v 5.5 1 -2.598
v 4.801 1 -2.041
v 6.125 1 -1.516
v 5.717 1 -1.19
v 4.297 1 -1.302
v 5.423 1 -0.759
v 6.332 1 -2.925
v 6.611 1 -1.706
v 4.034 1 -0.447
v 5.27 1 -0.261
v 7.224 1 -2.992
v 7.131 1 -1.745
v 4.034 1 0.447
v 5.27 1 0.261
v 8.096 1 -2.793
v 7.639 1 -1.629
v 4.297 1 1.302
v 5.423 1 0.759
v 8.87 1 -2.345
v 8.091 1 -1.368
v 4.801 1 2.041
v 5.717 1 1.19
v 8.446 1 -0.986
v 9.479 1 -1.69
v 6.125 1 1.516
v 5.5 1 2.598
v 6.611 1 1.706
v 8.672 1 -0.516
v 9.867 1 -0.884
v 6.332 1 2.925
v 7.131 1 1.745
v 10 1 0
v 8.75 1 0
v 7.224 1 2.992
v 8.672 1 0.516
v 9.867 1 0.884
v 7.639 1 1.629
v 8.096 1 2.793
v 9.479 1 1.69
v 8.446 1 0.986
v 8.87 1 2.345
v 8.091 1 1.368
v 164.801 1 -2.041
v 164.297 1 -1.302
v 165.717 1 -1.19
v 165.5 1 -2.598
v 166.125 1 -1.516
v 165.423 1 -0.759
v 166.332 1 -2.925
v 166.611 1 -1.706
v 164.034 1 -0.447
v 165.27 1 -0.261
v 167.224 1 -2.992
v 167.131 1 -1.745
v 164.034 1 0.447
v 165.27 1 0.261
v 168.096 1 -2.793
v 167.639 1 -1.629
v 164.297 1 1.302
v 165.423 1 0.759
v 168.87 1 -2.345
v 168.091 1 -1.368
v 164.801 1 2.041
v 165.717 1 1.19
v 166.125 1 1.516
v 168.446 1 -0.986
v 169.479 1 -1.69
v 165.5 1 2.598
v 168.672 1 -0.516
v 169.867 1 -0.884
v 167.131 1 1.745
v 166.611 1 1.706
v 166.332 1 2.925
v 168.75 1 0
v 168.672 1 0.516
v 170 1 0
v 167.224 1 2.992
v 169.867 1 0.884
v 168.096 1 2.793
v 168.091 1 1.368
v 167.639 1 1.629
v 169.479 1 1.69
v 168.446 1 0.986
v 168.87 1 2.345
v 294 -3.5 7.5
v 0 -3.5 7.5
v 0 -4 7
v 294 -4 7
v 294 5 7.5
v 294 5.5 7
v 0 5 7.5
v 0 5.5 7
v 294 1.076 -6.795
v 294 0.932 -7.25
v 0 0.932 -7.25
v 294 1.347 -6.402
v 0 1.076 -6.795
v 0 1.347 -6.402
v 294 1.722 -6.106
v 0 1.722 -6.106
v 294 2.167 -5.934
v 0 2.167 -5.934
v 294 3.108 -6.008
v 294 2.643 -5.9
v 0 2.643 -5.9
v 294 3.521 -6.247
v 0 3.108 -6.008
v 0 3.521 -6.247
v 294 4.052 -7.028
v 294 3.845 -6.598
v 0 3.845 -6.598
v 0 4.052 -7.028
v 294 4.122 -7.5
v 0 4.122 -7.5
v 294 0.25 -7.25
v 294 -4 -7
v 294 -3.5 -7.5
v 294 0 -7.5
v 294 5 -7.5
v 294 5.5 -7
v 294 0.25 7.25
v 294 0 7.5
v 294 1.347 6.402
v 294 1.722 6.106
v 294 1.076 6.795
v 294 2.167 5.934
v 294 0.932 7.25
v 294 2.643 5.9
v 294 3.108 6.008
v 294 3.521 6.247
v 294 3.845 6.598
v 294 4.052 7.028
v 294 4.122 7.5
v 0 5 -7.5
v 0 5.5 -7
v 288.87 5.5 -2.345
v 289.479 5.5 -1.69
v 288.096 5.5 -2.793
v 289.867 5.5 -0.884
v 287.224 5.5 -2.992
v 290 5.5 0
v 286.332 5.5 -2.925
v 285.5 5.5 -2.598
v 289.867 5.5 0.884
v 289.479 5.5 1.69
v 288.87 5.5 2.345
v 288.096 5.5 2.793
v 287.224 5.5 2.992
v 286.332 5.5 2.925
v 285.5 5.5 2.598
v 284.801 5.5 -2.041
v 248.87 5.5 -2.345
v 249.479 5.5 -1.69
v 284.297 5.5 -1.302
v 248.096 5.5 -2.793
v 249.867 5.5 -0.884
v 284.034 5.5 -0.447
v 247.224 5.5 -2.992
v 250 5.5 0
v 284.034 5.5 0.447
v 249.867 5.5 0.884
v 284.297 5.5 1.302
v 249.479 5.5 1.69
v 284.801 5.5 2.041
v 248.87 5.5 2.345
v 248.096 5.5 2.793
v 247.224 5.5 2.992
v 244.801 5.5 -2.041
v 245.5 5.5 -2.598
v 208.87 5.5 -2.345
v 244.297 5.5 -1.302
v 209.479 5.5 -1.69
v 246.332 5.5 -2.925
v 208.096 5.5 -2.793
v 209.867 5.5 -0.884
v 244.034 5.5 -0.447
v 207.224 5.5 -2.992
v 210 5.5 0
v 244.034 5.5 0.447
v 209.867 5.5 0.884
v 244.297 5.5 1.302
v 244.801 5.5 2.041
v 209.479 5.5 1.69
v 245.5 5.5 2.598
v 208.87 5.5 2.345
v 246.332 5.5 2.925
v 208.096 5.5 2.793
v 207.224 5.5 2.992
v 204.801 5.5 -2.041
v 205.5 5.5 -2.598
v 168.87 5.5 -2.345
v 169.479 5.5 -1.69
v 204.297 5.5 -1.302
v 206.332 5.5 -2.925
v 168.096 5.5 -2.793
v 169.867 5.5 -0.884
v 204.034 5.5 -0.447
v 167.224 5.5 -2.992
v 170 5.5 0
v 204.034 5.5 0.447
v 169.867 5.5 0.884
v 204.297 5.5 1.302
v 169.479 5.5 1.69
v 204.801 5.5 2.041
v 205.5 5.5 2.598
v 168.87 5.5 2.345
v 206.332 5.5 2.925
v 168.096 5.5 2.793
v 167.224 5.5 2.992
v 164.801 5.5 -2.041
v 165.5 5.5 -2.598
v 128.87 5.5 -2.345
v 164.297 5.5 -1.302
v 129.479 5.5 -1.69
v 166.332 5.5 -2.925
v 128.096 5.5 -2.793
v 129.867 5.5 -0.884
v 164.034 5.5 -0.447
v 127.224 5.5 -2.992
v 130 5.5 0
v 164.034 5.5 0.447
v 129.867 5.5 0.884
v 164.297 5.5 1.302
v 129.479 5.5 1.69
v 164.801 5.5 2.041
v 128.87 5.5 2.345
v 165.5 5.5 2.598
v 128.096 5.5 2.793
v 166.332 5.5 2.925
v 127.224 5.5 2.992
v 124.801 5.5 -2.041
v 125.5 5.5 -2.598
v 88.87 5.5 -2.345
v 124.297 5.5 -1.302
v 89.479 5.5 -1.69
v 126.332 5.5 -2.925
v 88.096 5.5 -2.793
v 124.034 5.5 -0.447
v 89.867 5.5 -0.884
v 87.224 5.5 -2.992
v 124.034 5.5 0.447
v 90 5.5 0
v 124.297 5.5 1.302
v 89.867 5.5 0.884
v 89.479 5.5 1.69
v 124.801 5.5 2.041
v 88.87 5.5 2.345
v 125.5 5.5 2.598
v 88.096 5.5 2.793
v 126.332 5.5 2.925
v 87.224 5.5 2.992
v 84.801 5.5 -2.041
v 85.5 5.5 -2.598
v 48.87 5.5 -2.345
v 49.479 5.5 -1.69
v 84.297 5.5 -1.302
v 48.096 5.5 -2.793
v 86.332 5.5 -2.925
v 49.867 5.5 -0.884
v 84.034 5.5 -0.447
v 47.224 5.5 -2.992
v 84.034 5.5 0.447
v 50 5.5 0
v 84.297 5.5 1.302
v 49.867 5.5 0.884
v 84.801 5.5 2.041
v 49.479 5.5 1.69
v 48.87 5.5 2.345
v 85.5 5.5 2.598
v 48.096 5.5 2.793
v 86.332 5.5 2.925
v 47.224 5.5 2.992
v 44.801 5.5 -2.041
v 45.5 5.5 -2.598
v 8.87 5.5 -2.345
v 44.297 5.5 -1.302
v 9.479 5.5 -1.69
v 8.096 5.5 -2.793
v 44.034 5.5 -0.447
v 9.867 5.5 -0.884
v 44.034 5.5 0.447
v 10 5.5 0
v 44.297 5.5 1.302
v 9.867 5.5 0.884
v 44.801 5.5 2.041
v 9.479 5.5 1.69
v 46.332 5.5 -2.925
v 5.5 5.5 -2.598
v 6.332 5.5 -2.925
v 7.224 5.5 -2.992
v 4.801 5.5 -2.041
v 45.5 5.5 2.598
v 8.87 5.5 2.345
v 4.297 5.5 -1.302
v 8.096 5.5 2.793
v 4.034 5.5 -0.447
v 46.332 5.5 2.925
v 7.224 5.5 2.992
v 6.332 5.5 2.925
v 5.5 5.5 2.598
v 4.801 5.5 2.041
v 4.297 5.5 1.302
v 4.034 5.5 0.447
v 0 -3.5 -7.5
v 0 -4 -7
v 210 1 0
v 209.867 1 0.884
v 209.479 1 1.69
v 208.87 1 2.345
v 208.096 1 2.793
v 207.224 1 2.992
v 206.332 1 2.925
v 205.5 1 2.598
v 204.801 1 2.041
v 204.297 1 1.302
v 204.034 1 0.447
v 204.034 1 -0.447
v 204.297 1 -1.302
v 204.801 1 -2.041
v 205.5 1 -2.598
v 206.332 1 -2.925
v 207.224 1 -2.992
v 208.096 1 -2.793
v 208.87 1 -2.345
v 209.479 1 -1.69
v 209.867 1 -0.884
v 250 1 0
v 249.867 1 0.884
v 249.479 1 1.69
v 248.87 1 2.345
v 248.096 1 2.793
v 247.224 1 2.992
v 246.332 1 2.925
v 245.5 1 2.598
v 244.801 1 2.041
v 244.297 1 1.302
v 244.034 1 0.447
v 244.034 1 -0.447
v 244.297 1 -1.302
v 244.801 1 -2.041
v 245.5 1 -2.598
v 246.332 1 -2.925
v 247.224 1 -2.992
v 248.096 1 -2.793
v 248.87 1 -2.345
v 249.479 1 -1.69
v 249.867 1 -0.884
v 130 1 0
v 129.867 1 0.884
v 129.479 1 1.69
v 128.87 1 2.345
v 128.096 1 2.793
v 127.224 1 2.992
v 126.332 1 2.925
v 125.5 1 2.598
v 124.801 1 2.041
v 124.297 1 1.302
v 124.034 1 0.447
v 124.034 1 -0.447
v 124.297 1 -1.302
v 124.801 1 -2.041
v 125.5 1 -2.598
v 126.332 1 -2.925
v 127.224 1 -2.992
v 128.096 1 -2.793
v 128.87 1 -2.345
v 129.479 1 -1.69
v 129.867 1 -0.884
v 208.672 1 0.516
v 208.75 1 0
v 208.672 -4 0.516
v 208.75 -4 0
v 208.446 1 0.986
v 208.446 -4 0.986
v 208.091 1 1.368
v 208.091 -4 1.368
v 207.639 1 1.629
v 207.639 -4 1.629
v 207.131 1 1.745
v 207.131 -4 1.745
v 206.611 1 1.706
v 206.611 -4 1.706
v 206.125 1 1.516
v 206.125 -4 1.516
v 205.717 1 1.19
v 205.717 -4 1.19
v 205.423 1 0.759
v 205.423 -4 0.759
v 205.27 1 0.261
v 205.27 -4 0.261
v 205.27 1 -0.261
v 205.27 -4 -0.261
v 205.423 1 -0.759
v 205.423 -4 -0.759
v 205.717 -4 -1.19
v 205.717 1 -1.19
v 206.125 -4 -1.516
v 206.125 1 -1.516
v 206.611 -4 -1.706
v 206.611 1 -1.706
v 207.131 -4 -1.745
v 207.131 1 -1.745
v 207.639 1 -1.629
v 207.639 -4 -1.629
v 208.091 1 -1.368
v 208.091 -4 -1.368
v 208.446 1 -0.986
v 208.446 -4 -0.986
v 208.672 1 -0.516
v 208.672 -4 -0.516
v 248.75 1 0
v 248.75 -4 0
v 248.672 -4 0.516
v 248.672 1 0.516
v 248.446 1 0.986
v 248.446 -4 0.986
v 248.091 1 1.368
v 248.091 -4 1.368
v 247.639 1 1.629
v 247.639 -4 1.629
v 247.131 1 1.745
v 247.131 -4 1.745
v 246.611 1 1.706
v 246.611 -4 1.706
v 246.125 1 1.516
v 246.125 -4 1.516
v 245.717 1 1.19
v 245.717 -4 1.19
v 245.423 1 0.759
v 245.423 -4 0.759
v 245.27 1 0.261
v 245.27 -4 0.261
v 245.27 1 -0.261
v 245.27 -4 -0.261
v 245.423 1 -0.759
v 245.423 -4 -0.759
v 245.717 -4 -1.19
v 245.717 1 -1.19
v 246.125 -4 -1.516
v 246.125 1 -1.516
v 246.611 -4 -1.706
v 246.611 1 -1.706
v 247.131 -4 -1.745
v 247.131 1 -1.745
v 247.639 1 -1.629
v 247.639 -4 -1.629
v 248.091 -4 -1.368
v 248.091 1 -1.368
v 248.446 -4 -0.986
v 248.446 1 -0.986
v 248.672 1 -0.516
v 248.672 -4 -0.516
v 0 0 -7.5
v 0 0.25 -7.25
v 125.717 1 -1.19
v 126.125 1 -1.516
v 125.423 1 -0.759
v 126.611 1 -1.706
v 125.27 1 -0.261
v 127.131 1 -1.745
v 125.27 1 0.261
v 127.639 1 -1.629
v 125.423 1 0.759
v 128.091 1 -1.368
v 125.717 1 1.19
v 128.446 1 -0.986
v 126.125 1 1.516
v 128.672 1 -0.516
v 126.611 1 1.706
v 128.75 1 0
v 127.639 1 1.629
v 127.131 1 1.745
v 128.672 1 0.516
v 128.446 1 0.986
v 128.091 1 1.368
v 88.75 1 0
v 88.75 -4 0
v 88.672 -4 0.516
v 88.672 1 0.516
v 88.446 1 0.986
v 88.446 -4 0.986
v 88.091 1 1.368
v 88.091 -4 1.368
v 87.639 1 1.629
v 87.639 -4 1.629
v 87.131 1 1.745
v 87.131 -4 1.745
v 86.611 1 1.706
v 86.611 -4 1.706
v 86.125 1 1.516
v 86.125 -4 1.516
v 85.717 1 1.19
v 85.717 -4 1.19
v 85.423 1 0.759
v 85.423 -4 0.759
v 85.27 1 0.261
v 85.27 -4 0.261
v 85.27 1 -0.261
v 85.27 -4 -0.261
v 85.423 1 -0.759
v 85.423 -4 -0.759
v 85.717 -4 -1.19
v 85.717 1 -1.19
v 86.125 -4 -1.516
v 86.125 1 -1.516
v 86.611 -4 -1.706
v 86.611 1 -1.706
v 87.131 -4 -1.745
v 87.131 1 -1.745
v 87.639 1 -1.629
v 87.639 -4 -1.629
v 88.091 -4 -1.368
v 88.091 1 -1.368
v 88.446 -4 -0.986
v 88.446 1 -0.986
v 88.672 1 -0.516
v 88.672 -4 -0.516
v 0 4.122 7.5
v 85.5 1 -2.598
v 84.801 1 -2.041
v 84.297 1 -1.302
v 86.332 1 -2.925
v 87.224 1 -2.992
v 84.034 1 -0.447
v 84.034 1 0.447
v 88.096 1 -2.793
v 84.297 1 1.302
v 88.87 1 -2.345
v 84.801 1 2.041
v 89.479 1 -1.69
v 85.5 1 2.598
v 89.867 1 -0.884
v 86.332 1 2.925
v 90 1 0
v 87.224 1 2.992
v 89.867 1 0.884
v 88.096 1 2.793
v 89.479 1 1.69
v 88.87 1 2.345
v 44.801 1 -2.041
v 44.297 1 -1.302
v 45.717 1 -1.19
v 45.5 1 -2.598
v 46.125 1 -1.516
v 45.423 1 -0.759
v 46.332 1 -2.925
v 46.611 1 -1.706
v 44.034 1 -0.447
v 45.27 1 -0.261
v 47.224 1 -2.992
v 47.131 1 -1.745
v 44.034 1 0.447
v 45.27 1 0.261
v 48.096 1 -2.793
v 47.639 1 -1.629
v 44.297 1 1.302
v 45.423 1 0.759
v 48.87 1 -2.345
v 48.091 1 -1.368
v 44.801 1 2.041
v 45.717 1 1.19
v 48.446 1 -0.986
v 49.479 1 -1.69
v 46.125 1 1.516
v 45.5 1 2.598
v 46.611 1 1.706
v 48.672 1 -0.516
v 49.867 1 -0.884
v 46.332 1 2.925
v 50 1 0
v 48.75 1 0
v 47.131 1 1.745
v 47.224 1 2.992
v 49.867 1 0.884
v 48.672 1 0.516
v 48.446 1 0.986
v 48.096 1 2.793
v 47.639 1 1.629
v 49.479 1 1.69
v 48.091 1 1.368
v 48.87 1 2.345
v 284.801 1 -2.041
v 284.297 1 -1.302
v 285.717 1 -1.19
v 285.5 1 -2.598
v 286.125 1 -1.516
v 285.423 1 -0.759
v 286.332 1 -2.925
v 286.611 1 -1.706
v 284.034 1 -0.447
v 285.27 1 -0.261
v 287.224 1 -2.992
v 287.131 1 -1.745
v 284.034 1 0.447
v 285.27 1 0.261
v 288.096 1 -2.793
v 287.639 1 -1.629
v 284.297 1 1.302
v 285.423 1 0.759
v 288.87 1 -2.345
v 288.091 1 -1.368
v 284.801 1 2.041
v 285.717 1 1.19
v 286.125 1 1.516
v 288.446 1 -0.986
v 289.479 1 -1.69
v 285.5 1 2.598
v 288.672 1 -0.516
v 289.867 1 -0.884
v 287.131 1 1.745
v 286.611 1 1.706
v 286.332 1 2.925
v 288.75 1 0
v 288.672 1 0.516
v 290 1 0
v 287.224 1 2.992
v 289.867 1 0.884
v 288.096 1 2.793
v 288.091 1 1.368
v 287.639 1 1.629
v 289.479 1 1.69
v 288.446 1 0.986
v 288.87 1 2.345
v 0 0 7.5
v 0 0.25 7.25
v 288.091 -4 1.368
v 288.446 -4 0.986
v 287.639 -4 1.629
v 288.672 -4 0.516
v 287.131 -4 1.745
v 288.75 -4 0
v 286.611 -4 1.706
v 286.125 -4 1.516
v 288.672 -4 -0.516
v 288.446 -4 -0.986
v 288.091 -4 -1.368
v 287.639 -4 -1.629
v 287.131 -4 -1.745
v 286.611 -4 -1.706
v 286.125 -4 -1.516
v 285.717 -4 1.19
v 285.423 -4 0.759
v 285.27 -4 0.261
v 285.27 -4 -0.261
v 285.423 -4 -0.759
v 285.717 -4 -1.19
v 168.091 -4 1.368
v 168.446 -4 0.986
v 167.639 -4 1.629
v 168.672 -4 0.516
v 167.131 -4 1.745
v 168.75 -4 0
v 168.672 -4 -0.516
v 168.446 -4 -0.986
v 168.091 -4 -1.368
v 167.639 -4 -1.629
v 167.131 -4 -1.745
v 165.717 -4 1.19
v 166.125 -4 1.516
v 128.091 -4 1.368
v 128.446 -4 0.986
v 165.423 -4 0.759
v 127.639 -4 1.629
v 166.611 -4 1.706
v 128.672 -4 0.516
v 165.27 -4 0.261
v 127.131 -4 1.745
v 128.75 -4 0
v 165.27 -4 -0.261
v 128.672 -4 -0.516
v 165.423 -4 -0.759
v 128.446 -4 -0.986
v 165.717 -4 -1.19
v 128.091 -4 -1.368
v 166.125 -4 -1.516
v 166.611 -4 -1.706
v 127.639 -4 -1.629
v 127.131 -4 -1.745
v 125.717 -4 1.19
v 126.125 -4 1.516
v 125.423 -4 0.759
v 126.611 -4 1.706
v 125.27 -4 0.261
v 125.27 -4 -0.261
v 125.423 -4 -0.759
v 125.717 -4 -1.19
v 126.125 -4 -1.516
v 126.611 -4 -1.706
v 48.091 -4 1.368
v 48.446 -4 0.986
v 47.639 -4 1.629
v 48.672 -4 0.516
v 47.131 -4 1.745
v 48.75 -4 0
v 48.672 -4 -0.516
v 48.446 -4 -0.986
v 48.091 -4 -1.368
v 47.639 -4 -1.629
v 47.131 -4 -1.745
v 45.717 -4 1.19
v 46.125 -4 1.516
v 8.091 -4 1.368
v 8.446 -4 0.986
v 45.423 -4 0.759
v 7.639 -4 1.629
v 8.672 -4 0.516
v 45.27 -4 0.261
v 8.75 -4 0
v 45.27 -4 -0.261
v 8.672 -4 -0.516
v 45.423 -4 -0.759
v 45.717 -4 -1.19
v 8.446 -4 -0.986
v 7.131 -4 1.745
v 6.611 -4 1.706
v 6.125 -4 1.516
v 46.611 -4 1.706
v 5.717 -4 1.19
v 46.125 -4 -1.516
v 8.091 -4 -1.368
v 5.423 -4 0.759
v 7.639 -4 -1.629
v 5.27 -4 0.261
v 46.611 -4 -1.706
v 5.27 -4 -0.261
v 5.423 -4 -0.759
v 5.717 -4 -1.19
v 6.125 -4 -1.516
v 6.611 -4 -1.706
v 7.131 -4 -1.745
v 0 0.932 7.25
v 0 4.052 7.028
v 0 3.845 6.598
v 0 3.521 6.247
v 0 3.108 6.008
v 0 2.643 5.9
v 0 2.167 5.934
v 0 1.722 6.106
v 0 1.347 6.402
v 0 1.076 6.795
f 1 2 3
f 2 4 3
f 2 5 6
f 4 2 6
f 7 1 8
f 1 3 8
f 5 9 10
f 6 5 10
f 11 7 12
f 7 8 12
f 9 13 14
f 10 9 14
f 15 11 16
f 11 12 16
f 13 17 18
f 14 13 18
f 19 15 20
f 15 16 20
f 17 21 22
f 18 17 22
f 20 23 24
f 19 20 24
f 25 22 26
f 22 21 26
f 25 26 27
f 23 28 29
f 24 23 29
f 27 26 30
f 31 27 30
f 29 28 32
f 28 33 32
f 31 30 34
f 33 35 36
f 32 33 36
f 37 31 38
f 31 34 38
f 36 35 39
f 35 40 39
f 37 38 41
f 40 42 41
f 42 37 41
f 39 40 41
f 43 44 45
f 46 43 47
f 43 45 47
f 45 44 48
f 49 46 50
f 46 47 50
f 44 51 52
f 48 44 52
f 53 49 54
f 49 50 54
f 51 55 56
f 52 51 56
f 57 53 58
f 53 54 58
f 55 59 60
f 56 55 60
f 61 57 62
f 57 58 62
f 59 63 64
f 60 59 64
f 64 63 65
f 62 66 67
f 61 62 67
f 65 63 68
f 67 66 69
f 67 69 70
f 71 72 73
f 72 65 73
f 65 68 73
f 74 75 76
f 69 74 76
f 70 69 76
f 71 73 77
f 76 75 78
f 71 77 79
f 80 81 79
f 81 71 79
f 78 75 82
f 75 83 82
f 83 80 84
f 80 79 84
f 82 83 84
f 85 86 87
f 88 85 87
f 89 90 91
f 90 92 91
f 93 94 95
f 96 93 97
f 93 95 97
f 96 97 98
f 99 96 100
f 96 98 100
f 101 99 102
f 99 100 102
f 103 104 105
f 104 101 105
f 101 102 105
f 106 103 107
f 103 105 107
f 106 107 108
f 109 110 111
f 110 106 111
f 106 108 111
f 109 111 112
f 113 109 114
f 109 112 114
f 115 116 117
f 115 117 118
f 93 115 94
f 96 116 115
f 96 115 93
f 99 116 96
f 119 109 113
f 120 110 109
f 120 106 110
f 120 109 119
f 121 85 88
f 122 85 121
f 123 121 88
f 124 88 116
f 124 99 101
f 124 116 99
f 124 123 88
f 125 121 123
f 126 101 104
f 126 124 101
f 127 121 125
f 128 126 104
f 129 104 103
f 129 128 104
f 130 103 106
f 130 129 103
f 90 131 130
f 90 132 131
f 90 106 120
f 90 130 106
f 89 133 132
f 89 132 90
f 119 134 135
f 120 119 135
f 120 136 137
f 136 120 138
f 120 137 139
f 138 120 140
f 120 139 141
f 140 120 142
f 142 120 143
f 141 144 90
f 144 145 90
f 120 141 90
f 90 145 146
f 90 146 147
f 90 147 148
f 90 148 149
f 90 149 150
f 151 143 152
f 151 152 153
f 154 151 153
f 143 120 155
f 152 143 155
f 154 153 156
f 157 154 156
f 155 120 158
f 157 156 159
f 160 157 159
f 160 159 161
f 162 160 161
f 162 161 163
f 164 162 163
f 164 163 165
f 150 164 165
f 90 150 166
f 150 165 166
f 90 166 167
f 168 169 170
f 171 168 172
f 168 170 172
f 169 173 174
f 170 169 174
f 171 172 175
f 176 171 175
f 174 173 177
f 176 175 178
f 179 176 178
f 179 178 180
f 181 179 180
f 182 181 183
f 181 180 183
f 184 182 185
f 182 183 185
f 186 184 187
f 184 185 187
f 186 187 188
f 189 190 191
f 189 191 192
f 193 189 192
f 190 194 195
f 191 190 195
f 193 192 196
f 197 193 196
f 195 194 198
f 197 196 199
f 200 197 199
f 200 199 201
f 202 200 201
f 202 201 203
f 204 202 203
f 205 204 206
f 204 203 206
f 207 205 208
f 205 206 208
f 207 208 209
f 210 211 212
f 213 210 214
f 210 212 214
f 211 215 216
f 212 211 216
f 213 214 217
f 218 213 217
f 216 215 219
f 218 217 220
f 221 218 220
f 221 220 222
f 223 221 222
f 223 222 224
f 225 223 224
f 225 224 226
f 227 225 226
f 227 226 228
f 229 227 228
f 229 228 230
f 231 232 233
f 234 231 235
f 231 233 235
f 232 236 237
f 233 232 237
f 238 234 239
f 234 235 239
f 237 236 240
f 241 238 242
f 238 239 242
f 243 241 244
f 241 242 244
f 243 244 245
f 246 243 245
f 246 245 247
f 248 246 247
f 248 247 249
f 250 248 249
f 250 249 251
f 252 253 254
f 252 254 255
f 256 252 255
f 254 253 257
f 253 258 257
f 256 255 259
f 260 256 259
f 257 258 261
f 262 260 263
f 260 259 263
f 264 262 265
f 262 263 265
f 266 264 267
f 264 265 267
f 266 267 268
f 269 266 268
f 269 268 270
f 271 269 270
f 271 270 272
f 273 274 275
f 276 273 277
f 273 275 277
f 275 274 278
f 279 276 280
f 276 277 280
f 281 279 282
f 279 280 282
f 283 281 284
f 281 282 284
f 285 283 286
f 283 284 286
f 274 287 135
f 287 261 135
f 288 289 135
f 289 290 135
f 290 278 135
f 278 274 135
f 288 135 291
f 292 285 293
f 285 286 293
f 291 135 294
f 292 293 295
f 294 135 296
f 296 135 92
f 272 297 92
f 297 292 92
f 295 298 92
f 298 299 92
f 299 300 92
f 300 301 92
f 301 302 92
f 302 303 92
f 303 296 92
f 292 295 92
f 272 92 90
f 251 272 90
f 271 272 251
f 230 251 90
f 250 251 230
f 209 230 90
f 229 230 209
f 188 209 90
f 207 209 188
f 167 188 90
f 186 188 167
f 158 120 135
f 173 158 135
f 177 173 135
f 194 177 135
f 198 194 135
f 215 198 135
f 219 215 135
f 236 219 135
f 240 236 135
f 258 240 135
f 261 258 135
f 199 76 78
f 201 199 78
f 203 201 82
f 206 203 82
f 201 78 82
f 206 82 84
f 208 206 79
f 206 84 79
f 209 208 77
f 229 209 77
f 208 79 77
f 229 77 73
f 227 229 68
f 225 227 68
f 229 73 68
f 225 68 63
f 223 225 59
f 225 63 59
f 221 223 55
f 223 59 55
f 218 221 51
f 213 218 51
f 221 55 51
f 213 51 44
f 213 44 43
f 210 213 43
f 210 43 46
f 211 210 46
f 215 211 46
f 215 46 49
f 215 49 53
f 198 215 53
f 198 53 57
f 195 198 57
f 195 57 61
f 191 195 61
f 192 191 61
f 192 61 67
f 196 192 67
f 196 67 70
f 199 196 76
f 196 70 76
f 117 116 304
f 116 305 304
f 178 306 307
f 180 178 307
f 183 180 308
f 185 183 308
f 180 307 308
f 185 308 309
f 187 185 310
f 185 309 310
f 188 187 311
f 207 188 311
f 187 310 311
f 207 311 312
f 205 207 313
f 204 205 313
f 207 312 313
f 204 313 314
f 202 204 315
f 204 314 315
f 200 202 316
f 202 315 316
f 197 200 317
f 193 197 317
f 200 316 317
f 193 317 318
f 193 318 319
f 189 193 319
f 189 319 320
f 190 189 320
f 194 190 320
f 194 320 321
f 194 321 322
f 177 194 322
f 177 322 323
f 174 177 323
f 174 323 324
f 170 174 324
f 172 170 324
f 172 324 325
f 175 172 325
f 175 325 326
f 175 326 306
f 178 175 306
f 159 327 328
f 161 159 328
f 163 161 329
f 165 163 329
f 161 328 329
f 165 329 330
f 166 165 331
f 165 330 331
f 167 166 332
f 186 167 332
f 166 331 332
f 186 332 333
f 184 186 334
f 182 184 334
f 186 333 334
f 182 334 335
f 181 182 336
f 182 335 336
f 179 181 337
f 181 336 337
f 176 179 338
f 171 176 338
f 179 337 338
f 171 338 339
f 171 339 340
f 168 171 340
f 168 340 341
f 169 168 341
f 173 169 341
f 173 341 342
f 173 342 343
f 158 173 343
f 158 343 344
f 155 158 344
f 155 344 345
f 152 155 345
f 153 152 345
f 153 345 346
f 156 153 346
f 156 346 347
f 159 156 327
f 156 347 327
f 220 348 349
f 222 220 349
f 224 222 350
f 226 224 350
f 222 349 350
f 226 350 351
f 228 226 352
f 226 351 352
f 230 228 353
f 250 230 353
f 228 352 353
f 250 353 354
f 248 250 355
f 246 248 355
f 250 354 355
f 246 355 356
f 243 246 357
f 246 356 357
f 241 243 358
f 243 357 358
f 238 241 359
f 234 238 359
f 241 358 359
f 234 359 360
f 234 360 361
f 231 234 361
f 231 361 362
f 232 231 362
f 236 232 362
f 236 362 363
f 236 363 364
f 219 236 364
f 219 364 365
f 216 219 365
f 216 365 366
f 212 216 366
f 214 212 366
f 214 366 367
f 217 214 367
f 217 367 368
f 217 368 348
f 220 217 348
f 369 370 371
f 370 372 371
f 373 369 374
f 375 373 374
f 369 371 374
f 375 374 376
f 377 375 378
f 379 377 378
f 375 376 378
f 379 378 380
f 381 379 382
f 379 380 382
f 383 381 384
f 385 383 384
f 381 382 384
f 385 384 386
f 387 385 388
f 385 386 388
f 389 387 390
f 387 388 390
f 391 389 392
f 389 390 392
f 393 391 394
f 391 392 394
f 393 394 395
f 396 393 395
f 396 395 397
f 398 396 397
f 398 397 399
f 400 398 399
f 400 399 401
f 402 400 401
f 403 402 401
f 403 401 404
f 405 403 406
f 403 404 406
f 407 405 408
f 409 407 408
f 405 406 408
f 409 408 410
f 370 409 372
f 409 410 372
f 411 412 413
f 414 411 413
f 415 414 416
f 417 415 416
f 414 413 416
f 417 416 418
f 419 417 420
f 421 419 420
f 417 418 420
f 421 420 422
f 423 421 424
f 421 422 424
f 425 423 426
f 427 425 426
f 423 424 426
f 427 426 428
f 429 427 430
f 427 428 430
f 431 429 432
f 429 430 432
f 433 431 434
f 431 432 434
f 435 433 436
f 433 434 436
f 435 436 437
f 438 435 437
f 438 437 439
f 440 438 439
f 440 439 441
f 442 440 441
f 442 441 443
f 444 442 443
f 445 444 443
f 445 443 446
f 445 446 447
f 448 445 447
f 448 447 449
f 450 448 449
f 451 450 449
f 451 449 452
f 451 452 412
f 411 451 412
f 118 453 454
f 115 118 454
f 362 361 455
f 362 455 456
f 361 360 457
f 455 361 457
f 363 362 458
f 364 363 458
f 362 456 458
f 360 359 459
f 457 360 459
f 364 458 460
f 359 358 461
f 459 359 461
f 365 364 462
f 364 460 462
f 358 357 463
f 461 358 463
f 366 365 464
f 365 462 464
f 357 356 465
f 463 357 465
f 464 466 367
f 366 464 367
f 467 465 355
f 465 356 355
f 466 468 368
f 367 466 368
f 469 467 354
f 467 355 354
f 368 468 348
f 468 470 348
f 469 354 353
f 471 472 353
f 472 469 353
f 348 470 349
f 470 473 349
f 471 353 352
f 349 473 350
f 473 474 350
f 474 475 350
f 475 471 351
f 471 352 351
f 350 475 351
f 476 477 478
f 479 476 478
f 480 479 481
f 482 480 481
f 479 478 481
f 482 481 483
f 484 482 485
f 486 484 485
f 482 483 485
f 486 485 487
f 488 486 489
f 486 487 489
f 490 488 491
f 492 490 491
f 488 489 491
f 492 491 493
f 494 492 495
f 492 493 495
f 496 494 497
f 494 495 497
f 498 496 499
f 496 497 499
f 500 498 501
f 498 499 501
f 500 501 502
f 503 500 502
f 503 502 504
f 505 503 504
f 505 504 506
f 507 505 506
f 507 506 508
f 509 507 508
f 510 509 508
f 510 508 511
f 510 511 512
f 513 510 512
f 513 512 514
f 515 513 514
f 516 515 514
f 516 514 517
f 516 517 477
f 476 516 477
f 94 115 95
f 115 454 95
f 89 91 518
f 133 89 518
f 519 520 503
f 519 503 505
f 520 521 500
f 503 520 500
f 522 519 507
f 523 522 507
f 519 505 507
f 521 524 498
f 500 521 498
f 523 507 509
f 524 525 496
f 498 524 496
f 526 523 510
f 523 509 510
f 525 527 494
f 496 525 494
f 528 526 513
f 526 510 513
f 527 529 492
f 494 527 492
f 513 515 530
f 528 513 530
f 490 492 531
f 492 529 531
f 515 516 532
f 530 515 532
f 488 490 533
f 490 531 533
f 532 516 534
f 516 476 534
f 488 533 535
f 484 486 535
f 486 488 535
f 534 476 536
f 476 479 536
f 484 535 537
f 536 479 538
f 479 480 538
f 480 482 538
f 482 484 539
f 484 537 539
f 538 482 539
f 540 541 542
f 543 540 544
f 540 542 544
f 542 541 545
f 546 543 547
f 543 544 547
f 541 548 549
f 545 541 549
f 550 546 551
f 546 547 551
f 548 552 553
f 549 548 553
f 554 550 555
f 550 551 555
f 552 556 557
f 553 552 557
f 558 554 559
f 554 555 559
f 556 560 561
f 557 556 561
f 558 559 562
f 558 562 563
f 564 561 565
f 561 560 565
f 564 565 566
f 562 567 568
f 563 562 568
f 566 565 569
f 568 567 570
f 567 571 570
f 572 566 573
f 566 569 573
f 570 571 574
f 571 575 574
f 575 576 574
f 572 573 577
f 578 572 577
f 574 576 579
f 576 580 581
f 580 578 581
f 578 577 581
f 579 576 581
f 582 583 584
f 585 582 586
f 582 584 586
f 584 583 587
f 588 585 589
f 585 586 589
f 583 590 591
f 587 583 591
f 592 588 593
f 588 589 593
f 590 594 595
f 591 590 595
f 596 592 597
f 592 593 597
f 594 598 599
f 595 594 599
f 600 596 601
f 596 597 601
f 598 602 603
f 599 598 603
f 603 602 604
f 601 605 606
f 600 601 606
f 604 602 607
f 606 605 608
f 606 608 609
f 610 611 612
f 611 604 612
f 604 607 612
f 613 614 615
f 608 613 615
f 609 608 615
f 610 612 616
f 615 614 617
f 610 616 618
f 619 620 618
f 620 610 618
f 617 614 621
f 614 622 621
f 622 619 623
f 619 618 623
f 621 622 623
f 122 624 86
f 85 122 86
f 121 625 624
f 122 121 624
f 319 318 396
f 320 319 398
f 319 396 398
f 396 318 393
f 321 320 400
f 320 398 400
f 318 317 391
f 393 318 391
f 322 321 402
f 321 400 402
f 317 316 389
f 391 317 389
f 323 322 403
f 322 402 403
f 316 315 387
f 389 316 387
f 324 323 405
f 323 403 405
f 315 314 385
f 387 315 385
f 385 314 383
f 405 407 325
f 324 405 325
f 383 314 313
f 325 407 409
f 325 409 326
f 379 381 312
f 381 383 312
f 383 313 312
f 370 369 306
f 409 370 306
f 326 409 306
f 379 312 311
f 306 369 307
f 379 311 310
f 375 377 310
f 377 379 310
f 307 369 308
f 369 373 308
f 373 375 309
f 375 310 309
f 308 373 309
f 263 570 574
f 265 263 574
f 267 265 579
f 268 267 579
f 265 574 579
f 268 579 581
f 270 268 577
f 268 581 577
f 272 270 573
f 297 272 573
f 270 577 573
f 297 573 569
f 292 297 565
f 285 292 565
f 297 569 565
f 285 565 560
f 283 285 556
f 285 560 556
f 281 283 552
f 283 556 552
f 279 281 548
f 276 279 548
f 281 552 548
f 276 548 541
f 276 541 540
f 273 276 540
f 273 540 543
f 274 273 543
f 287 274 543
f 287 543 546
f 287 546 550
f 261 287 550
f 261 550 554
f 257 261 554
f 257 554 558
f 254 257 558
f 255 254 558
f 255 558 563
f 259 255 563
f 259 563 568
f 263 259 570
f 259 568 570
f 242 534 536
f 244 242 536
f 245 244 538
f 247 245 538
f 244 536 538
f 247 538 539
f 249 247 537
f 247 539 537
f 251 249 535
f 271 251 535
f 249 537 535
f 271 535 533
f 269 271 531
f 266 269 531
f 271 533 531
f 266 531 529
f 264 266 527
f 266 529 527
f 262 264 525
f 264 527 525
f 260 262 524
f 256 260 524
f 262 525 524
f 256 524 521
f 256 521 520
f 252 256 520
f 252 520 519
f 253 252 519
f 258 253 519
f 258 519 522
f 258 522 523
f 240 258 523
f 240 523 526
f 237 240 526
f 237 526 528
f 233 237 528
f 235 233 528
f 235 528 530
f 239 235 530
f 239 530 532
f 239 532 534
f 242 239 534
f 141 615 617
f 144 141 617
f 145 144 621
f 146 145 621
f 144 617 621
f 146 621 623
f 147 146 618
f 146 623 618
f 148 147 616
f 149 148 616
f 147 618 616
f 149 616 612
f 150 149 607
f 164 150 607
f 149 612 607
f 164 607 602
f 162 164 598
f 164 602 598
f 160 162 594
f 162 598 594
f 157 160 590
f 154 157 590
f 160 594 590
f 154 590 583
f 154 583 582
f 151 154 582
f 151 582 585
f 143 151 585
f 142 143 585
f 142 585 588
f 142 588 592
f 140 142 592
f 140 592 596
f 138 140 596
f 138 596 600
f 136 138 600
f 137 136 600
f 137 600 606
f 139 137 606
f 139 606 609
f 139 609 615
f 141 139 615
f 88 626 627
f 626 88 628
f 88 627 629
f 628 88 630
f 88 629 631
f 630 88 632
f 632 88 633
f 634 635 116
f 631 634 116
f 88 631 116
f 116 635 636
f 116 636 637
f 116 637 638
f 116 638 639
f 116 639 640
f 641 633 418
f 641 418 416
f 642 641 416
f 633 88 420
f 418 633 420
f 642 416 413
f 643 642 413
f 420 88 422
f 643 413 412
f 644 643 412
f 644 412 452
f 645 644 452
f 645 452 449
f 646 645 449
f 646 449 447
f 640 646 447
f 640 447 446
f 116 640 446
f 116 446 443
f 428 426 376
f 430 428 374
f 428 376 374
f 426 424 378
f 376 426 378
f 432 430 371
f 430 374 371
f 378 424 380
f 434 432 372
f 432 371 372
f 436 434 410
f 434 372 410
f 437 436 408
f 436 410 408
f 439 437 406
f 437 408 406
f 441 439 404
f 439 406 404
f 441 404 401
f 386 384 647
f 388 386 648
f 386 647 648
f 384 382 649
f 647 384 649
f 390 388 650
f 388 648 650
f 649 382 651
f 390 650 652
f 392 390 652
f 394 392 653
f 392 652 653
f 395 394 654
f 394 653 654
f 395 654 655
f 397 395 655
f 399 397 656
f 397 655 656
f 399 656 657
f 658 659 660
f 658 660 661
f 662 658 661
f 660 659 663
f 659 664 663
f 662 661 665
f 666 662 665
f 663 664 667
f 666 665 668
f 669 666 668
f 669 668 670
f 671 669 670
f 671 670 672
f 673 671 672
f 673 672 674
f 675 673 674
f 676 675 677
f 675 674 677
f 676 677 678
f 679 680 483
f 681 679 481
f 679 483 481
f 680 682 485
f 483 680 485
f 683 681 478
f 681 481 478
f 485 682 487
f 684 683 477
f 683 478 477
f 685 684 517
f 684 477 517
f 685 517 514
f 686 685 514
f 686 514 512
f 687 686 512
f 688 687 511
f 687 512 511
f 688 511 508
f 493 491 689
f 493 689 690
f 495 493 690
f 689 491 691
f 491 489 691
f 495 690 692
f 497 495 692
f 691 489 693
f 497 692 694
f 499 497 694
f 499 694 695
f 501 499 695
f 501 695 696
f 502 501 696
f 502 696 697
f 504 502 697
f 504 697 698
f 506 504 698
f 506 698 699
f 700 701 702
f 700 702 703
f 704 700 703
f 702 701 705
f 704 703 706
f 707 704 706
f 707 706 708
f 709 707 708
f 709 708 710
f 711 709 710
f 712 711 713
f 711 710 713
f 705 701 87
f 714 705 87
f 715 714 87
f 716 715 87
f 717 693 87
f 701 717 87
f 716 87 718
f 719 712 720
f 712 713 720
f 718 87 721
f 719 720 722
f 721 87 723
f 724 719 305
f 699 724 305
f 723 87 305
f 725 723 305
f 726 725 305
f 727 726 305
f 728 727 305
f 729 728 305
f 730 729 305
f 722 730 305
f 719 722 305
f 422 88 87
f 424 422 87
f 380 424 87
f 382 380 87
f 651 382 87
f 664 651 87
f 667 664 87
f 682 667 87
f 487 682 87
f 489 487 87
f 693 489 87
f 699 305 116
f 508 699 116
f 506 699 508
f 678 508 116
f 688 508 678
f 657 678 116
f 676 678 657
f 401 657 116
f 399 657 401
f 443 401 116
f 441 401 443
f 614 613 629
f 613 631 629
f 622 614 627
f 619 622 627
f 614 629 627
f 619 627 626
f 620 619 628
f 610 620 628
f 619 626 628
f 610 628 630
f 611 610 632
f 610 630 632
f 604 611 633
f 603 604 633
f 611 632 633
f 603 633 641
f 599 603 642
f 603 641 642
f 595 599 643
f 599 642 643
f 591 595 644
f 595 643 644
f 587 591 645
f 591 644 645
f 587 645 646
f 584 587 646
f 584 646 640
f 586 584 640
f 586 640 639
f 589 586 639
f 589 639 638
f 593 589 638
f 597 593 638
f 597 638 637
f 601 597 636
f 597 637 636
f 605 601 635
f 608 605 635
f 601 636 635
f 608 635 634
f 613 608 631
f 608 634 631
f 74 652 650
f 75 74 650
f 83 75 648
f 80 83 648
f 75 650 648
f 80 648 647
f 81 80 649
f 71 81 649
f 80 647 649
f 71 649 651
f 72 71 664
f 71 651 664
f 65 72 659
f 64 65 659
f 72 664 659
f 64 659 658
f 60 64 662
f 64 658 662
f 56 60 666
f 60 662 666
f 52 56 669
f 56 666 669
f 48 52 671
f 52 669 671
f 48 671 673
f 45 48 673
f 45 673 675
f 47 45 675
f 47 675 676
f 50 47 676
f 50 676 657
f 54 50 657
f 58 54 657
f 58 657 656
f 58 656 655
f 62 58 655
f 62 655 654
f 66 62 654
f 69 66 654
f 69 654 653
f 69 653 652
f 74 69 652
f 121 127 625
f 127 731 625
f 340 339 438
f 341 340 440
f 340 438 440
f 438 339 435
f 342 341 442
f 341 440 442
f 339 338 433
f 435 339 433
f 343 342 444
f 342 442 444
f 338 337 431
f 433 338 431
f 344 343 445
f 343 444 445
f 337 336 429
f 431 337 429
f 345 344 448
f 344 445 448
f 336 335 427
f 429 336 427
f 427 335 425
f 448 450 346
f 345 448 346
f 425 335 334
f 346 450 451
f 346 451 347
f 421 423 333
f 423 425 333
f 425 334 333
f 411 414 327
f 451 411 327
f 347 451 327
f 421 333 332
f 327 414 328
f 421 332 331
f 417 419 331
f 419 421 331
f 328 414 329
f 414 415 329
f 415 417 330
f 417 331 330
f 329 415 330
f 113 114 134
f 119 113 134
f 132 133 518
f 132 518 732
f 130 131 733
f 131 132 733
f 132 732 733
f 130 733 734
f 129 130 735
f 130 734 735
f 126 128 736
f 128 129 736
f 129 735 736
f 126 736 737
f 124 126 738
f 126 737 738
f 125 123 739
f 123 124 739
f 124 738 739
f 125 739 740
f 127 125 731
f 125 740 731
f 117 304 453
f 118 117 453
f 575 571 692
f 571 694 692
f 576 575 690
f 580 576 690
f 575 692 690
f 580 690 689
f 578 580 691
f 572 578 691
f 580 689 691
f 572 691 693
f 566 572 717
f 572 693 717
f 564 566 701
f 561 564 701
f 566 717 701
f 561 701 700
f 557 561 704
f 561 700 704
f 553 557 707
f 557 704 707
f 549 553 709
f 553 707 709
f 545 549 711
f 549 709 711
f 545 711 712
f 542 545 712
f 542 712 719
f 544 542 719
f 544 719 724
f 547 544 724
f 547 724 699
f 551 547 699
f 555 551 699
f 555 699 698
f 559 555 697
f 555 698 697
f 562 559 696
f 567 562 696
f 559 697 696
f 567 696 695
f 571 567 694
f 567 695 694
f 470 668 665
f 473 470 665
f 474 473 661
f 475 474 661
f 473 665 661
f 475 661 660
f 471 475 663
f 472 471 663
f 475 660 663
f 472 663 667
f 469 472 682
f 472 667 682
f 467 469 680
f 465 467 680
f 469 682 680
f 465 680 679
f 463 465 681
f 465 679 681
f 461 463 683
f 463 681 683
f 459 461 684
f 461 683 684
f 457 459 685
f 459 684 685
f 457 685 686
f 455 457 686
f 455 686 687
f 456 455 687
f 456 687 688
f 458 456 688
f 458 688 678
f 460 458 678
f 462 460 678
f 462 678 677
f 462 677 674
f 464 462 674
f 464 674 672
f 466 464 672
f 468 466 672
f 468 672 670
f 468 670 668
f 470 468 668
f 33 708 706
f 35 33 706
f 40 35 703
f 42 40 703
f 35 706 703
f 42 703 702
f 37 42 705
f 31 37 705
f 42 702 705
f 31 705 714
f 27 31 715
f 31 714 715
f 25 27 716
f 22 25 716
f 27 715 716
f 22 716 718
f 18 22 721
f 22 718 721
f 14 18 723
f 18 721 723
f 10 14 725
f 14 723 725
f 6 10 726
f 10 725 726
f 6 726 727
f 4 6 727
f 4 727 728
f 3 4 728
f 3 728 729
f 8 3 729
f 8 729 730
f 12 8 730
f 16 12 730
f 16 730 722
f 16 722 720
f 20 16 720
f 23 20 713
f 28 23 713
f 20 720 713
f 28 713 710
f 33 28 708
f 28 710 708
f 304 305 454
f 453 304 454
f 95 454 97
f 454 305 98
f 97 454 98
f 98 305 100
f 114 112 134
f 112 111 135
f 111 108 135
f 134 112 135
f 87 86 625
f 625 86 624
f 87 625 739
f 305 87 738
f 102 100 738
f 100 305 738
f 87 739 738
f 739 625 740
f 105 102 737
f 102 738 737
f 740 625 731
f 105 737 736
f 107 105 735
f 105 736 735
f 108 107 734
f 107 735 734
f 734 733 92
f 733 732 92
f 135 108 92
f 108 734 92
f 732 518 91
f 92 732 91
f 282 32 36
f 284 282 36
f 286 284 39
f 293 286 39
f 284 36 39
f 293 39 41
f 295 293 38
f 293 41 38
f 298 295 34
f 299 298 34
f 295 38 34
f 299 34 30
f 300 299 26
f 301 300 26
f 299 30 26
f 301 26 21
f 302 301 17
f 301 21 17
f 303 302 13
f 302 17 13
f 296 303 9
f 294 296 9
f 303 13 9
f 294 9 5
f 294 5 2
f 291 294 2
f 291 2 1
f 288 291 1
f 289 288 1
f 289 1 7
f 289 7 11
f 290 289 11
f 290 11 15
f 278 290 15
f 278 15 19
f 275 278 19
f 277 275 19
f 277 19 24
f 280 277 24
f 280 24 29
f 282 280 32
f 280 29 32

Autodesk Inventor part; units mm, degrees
sketch "Sketch_11" plane through (0, 0, 0) normal (1, 0, 0) x (0, 1, 0)
  line L0 (5, 7.5) -> (4.1225, 7.5)
  arc A0 (0.9321, 7.25) -> (4.1225, 7.5) centre (2.5175, 7.5) ccw
  line L1 (0.9321, 7.25) -> (0.25, 7.25)
  line L2 (0.25, 7.25) -> (0, 7.5)
  line L3 (0, 7.5) -> (-3.5, 7.5)
  line L4 (-3.5, 7.5) -> (-4, 7)
  line L5 (-4, 7) -> (-4, -6.9999)
  line L6 (-4, -6.9999) -> (-3.5, -7.5)
  line L7 (-3.5, -7.5) -> (0, -7.5)
  line L8 (0, -7.5) -> (0.25, -7.25)
  line L9 (0.25, -7.25) -> (0.9321, -7.25)
  arc A1 (4.1225, -7.5) -> (0.9321, -7.25) centre (2.5175, -7.5) ccw
  line L10 (4.1225, -7.5) -> (5, -7.5)
  line L11 (5, -7.5) -> (5.5, -7)
  line L12 (5.5, -7) -> (5.5, 7)
  line L13 (5.5, 7) -> (5, 7.5)
extrude "Extrusion1" add sketch "Sketch_11" along normal blind 294
sketch "Sketch_17" plane through (0, 0, 0) normal (0, 0, 1) x (1, 0, 0)
  line L0 (7, -4.5) -> (7, 6)
  line L1 (7, 6) -> (10, 6)
  line L2 (10, 6) -> (10, 1)
  line L3 (10, 1) -> (8.75, 1)
  line L4 (8.75, 1) -> (8.75, -4.5)
  line L5 (8.75, -4.5) -> (7, -4.5)
  line L6 (7, -4.5) -> (7, 6)
revolve "Revolution1" cut sketch "Sketch_17" angle 360 about axis through (7, -4.5, 0) along (0, -1, 0)
pattern_linear "Rectangular Pattern1" count 8 spacing 40 along (1, 0, 0) of "Revolution1"
ref_plane "dummy_XY" through (7, -4, 0) normal (1, 0, 0) x (0, 0, -1)
ref_plane "dummy_YZ" through (7, -4, 0) normal (0, 0, -1) x (0, 1, 0)
ref_plane "dummy_ZX" through (7, -4, 0) normal (0, 1, 0) x (1, 0, 0)
ref_plane "slider_XY" through (20, 0, 0) normal (-1, 0, 0) x (0, 0, -1)
ref_plane "slider_YZ" through (20, 0, 0) normal (0, 0, -1) x (0, -1, 0)
ref_plane "slider_ZX" through (20, 0, 0) normal (0, -1, 0) x (-1, 0, 0)
ref_plane "slider2_XY" through (100, 0, 0) normal (-1, 0, 0) x (0, 0, -1)
ref_plane "slider2_YZ" through (100, 0, 0) normal (0, 0, -1) x (0, -1, 0)
ref_plane "slider2_ZX" through (100, 0, 0) normal (0, -1, 0) x (-1, 0, 0)
properties part number "LU15AL294K2720100_rail"
